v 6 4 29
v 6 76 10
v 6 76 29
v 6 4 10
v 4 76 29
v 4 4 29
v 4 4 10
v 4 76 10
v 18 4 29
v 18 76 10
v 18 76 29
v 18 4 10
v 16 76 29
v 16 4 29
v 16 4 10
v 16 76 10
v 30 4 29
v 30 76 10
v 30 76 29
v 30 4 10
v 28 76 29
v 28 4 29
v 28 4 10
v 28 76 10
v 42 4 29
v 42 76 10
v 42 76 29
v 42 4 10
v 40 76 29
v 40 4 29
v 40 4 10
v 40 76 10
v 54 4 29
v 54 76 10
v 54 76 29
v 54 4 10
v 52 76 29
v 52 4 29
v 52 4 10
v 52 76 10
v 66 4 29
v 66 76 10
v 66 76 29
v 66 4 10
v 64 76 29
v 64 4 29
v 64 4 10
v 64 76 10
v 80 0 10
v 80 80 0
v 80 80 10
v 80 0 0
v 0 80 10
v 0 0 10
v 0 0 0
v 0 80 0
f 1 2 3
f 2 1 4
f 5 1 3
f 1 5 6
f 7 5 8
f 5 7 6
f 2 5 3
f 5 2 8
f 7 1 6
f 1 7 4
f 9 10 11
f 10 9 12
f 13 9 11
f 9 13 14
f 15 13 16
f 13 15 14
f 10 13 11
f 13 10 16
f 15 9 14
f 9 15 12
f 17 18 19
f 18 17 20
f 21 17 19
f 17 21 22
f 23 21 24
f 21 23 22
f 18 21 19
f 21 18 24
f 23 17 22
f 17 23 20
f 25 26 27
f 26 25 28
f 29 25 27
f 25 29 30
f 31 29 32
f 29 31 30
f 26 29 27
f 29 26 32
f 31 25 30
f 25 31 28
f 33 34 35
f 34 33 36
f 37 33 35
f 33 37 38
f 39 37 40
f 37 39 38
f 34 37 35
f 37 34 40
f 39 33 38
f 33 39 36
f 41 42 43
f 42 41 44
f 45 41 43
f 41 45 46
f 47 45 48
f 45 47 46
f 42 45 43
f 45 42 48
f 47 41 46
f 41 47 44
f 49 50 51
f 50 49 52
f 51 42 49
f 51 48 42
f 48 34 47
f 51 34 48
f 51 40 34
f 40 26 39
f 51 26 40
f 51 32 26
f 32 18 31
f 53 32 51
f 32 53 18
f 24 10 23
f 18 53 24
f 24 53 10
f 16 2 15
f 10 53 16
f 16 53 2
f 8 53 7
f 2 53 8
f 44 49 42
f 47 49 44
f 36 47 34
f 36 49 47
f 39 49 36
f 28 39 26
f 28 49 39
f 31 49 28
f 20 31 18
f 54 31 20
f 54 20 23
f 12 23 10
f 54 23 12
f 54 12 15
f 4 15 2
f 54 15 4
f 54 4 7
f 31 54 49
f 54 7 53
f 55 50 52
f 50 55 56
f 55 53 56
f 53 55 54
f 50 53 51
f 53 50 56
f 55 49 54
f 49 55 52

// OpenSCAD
$fn = 32;

// ----------------------------------------------------------------------
// Heatsink: uniform fin block
// ----------------------------------------------------------------------

// --- parameters (mm) ---
base_l = 80;              // base length, X
base_w = 80;              // base width, Y
base_t = 10;              // base plate thickness
fin_h = 20;               // fin height above the base
fin_t = 2;                // fin thickness
edge = 4;                 // margin from the base ends
pitch = 12;               // fin pitch
fit_tol = 0.1;            // tolerance for press fits, mm
free_tol = 0.5;           // tolerance for clearance fits, mm

n_fins = floor((base_l - 2 * edge - fin_t) / pitch) + 1;  // fin count
total_h = base_t + fin_h - 1;  // overall height

union() {
  cube([base_l, base_w, base_t]);
  for (i = [0 : n_fins - 1])
    translate([edge + i * pitch, edge, base_t - 1])
      cube([fin_t, base_w - 2 * edge, fin_h]);
}
